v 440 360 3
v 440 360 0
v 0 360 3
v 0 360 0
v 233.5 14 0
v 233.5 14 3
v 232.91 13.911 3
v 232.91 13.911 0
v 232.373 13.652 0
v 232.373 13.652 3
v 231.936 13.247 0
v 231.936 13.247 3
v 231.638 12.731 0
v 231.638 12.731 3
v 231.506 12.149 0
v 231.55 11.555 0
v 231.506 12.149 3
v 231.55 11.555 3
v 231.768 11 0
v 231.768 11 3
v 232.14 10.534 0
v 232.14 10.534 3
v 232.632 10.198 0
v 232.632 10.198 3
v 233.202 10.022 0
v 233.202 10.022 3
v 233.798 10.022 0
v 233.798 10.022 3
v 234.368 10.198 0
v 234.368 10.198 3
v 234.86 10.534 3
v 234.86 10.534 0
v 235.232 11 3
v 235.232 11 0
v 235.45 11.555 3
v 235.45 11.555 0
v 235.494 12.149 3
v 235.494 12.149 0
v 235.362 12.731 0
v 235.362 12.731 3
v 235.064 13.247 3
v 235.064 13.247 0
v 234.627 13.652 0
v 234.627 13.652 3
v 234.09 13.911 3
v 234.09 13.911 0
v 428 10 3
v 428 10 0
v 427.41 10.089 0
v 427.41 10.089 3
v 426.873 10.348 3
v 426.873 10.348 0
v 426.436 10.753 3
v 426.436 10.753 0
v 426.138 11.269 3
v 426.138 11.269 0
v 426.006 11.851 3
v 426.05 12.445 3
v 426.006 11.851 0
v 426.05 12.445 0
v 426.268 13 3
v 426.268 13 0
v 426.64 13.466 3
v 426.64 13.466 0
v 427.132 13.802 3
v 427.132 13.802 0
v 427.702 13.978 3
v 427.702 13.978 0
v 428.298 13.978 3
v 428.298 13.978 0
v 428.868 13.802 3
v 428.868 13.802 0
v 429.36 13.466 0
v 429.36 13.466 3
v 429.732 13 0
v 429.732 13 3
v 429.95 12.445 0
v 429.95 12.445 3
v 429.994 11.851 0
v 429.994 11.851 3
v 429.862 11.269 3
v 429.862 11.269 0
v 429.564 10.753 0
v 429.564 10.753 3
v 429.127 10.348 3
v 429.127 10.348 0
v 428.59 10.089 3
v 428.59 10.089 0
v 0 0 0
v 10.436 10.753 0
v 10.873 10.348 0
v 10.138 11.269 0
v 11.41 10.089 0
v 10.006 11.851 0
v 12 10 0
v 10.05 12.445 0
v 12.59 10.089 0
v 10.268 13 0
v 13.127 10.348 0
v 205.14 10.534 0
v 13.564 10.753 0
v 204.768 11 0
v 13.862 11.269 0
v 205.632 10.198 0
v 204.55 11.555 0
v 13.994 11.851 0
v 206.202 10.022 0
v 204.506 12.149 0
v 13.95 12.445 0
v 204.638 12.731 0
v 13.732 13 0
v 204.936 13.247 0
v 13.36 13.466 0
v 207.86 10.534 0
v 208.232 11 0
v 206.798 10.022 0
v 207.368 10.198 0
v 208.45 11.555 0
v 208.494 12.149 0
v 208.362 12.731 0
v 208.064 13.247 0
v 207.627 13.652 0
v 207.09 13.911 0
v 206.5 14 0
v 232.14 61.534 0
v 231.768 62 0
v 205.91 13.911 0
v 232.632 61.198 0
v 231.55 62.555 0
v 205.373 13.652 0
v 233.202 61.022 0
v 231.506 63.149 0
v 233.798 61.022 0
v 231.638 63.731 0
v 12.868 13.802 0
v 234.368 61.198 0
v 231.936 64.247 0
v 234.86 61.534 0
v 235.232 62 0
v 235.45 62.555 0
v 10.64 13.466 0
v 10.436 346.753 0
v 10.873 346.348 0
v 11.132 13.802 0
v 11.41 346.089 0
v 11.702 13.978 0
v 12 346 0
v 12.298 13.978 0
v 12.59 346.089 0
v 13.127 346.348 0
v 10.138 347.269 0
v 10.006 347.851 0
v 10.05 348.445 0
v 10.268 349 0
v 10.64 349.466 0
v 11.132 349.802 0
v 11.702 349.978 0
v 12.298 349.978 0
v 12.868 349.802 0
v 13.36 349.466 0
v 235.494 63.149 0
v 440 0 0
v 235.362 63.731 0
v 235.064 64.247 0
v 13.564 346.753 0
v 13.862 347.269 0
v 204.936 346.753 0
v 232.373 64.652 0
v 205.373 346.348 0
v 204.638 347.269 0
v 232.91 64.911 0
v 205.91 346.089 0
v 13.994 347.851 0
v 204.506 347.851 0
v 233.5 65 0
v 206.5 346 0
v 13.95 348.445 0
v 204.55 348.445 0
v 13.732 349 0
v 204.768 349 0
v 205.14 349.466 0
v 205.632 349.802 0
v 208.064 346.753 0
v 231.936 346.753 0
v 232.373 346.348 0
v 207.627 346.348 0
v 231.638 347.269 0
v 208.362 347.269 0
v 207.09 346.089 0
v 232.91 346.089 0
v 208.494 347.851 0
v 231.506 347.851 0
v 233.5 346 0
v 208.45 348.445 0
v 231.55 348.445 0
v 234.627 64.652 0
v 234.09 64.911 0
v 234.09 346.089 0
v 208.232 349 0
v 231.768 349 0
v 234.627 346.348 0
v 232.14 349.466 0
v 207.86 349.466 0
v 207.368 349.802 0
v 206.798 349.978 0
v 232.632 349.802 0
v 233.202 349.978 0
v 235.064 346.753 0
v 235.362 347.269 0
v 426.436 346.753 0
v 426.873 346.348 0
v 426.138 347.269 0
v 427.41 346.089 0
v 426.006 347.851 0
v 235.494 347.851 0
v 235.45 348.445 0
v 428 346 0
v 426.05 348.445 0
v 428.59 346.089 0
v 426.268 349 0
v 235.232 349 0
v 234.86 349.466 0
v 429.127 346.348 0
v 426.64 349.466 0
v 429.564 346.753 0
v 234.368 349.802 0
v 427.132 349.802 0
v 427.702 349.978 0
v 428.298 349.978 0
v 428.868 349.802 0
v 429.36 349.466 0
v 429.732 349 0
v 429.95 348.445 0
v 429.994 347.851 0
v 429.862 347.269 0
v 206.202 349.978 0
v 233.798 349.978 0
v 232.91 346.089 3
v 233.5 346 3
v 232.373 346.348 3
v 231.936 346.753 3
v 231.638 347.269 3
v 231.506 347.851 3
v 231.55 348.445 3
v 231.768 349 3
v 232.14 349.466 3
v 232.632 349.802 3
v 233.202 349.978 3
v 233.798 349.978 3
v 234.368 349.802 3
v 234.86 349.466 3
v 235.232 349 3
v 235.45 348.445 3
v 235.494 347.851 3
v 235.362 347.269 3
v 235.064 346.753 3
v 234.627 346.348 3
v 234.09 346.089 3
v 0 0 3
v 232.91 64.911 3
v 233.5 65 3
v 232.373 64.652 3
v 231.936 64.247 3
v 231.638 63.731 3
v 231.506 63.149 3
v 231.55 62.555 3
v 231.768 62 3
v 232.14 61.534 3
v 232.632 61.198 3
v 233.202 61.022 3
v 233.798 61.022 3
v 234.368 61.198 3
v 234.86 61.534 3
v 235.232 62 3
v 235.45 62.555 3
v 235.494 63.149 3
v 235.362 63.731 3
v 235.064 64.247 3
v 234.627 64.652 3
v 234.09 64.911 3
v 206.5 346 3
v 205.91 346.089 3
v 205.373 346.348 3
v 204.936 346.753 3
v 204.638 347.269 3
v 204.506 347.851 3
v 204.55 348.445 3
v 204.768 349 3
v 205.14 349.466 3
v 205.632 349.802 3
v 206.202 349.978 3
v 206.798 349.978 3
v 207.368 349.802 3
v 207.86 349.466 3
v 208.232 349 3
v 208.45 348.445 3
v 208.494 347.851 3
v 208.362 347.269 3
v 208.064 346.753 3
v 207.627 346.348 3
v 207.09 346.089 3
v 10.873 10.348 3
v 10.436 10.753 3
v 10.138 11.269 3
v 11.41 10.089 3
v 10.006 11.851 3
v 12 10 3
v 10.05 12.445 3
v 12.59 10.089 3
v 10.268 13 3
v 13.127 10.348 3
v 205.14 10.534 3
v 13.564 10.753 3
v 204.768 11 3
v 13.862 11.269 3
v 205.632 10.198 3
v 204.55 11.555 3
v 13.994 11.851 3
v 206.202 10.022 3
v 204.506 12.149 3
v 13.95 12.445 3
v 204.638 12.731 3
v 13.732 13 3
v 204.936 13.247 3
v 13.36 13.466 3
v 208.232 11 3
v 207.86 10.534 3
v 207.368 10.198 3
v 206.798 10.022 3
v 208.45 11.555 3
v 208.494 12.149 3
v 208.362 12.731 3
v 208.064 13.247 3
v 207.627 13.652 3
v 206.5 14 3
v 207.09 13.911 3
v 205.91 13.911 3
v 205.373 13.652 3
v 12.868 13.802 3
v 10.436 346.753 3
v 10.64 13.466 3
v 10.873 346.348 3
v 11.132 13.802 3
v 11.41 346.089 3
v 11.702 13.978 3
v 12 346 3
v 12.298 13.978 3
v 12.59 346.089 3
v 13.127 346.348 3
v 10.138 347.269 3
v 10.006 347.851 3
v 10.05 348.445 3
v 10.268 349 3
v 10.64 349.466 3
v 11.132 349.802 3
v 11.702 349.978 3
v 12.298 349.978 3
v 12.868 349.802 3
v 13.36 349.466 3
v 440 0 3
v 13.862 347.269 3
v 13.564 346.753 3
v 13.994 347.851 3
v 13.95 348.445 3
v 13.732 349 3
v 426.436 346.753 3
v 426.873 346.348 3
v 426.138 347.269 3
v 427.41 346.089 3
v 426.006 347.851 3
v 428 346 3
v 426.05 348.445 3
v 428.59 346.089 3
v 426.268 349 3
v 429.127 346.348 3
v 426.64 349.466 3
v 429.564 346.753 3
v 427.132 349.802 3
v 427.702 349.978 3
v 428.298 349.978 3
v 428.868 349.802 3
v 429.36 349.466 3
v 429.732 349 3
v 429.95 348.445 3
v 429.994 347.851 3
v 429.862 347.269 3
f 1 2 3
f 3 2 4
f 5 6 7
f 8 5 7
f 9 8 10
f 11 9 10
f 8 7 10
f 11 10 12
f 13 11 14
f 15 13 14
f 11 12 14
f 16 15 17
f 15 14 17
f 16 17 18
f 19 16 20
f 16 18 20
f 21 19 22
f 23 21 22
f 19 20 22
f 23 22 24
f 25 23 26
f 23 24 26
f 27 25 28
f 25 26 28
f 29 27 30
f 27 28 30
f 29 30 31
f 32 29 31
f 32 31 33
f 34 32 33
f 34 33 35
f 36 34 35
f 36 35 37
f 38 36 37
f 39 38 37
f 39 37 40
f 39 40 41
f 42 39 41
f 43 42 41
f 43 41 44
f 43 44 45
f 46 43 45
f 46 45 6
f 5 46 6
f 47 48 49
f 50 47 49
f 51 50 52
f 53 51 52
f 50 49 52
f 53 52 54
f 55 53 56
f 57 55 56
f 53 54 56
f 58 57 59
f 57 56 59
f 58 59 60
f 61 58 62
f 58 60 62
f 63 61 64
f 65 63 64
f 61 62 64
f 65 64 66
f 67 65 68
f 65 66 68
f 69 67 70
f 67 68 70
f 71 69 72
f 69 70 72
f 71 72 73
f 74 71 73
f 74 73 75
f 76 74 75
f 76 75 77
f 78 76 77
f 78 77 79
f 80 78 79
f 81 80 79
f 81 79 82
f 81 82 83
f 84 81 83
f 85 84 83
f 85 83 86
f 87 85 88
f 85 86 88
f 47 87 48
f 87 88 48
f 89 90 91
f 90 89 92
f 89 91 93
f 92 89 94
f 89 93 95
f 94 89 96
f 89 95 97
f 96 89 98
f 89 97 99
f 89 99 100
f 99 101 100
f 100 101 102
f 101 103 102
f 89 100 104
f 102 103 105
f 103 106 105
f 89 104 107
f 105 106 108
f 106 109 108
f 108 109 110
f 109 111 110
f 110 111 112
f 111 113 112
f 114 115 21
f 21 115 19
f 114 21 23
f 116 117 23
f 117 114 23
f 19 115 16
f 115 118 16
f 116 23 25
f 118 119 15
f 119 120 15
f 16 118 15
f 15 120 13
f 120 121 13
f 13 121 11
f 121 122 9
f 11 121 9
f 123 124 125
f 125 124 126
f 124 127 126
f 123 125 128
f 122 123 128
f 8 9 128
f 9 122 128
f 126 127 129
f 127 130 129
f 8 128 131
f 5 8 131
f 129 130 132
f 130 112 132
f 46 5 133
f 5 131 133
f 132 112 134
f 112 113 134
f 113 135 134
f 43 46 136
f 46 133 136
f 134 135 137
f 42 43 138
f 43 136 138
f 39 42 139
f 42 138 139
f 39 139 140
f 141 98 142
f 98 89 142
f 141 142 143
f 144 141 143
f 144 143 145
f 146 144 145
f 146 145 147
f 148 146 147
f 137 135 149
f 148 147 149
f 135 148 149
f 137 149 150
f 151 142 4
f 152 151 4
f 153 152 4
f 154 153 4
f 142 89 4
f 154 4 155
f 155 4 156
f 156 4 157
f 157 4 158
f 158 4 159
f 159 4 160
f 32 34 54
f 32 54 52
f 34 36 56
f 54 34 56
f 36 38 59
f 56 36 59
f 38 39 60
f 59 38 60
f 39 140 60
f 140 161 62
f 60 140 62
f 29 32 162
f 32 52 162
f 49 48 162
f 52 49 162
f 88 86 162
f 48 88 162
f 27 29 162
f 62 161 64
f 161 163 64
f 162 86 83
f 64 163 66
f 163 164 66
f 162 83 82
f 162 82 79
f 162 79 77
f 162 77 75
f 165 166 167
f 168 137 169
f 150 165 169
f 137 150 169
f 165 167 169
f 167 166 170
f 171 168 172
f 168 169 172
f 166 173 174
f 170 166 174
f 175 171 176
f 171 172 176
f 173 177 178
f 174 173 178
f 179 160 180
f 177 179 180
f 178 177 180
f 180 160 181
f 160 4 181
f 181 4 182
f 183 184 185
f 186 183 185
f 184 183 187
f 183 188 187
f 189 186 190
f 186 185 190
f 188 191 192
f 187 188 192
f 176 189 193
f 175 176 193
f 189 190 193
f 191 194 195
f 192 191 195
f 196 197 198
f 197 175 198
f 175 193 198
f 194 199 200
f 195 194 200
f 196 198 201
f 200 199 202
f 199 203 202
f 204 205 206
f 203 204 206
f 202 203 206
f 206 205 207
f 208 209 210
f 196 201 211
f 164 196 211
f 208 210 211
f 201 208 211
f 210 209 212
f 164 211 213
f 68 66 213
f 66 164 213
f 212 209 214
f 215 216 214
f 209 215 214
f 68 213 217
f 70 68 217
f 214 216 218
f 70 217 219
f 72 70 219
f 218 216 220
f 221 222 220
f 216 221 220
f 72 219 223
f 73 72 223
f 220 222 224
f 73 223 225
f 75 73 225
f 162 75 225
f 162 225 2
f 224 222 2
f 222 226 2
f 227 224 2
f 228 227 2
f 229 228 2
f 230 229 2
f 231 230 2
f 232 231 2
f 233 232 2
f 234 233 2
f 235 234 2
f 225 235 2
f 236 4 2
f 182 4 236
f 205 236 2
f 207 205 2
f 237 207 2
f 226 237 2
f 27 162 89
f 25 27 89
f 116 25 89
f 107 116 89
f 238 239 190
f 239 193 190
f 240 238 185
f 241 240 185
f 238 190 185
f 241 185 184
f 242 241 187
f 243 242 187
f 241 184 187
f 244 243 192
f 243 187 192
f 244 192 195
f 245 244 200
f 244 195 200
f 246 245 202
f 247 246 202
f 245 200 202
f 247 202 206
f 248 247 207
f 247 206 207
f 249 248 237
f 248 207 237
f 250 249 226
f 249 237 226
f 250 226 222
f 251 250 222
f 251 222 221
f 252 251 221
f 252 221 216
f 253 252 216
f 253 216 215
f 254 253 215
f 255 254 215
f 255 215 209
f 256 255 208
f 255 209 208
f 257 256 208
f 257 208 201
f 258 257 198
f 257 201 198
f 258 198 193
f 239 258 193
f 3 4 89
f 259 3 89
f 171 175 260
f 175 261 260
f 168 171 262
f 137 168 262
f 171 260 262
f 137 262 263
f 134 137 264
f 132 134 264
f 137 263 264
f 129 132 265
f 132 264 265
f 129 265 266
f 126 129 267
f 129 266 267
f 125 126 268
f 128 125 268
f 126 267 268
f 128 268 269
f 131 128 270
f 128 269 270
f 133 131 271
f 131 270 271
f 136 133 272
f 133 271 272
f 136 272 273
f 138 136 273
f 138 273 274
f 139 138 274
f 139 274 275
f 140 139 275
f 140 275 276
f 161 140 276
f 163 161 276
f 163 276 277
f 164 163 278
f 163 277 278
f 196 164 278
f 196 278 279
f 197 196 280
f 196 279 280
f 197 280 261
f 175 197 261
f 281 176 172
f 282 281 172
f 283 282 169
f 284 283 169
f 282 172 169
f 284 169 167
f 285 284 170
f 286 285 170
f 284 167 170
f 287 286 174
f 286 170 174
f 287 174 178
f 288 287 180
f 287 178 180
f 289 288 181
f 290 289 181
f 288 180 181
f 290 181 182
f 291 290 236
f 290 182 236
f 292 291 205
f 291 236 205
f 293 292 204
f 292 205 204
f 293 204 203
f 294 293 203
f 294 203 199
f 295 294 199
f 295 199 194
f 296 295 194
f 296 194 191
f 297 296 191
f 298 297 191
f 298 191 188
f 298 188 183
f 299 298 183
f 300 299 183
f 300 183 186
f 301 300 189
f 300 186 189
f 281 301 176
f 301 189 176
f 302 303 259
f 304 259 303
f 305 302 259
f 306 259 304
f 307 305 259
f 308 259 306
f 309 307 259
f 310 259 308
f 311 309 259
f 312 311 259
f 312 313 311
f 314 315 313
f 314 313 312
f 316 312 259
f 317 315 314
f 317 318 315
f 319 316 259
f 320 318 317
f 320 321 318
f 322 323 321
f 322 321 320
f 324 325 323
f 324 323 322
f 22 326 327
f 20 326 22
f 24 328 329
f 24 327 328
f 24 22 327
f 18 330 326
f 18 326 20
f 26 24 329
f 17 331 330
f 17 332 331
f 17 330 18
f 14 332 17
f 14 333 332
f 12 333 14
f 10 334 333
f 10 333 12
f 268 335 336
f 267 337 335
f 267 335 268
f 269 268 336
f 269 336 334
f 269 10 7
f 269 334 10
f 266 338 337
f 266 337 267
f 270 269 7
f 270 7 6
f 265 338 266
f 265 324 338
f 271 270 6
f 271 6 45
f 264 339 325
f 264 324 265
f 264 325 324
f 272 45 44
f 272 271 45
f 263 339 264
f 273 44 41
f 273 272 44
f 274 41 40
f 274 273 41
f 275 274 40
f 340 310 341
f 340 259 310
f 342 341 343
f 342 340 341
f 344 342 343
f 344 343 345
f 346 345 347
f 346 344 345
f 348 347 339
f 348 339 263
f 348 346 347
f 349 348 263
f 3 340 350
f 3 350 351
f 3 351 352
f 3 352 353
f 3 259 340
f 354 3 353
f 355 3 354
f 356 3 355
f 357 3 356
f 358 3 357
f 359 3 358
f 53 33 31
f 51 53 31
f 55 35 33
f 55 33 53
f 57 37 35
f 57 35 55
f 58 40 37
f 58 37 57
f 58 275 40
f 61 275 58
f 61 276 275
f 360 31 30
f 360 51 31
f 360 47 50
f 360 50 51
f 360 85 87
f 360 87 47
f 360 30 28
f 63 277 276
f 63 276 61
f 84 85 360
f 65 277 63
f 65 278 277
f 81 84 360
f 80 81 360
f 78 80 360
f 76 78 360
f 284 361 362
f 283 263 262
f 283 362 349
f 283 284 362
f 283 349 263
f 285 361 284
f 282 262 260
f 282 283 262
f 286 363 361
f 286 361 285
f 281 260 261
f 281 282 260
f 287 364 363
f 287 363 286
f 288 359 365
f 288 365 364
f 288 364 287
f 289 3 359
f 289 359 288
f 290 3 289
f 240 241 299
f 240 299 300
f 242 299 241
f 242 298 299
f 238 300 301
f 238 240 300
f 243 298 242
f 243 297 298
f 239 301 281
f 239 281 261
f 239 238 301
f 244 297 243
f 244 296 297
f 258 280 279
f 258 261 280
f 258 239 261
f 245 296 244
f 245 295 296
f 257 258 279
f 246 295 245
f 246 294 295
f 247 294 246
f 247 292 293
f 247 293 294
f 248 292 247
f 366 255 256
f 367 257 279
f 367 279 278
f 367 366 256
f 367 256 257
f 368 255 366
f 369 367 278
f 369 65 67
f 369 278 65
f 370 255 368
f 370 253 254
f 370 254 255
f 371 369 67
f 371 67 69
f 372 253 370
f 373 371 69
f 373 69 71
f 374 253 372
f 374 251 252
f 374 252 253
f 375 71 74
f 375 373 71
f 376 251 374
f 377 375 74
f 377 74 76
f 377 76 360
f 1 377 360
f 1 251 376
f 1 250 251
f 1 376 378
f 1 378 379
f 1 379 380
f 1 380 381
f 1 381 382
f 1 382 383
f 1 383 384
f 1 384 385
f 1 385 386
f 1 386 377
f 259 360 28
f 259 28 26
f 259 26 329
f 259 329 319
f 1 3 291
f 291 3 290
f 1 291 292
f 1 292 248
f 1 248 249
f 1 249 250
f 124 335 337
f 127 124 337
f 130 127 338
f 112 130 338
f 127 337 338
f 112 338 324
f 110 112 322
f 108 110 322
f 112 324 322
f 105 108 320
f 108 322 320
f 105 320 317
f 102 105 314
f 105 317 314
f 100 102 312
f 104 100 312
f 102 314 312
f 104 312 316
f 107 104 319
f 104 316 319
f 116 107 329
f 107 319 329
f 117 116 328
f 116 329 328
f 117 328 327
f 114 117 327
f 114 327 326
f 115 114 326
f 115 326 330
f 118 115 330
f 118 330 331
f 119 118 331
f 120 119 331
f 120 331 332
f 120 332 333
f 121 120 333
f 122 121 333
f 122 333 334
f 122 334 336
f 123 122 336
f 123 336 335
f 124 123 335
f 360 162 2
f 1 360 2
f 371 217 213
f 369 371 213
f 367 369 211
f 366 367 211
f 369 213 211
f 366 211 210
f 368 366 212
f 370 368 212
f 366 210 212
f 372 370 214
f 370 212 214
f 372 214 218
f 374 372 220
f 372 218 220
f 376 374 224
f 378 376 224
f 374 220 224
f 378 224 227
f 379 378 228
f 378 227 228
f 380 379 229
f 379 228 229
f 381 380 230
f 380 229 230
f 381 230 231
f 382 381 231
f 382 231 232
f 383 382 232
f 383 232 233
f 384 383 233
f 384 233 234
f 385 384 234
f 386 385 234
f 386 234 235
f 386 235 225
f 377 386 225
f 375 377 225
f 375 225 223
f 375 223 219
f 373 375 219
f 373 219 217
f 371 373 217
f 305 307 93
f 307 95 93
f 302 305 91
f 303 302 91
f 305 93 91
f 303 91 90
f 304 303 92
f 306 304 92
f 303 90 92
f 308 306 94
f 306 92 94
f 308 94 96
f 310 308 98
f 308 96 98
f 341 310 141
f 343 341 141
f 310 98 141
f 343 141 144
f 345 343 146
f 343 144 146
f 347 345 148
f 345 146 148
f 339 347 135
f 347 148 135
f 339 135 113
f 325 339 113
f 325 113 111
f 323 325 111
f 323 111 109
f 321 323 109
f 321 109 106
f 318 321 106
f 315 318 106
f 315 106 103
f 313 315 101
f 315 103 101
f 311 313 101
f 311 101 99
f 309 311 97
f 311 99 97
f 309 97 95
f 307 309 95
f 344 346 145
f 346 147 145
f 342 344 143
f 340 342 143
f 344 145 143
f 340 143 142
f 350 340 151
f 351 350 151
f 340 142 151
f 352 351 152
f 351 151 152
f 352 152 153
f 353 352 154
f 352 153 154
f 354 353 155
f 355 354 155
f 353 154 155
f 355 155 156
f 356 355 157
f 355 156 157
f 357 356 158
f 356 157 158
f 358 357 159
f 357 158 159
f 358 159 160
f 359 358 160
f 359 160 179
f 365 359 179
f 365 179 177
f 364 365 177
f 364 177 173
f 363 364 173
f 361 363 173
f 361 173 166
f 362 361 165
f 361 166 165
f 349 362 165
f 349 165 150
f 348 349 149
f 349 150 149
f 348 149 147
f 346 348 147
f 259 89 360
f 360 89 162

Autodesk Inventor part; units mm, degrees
ref_plane "YZ Plane" through (0, 0, 0) normal (1, 0, 0) x (0, 1, 0)
ref_plane "XZ Plane" through (0, 0, 0) normal (0, 1, 0) x (-1, 0, 0)
ref_plane "XY Plane" through (0, 0, 0) normal (0, 0, 1) x (1, 0, 0)
sketch "Sketch1" plane through (0, 0, 0) normal (0, 0, 1) x (1, 0, 0)
  line L0 (0, 0) -> (440, 0)
  line L1 (440, 0) -> (440, 360)
  line L2 (440, 360) -> (0, 360)
  line L3 (0, 360) -> (0, 0)
  dimension "d0" = 440
  dimension "d1" = 360
extrude "Extrusion1" add sketch "Sketch1" along normal blind 3
hole "Hole1" at (12, 12, 3) direction (0, 0, -1) diameter 4 end through all
hole "Hole2" at (428, 12, 3) direction (0, 0, -1) diameter 4 end through all
hole "Hole3" at (428, 348, 3) direction (0, 0, -1) diameter 4 end through all
hole "Hole4" at (12, 348, 3) direction (0, 0, -1) diameter 4 end through all
hole "Hole5" at (233.5, 12, 0) direction (0, 0, 1) diameter 4 end through all
hole "Hole6" at (206.5, 12, 0) direction (0, 0, 1) diameter 4 end through all
hole "Hole7" at (233.5, 63, 0) direction (0, 0, 1) diameter 4 end through all
hole "Hole8" at (233.5, 348, 3) direction (0, 0, -1) diameter 4 end through all
hole "Hole9" at (206.5, 348, 3) direction (0, 0, -1) diameter 4 end through all
properties part number "FrameLeftSide" material "Dibond"
